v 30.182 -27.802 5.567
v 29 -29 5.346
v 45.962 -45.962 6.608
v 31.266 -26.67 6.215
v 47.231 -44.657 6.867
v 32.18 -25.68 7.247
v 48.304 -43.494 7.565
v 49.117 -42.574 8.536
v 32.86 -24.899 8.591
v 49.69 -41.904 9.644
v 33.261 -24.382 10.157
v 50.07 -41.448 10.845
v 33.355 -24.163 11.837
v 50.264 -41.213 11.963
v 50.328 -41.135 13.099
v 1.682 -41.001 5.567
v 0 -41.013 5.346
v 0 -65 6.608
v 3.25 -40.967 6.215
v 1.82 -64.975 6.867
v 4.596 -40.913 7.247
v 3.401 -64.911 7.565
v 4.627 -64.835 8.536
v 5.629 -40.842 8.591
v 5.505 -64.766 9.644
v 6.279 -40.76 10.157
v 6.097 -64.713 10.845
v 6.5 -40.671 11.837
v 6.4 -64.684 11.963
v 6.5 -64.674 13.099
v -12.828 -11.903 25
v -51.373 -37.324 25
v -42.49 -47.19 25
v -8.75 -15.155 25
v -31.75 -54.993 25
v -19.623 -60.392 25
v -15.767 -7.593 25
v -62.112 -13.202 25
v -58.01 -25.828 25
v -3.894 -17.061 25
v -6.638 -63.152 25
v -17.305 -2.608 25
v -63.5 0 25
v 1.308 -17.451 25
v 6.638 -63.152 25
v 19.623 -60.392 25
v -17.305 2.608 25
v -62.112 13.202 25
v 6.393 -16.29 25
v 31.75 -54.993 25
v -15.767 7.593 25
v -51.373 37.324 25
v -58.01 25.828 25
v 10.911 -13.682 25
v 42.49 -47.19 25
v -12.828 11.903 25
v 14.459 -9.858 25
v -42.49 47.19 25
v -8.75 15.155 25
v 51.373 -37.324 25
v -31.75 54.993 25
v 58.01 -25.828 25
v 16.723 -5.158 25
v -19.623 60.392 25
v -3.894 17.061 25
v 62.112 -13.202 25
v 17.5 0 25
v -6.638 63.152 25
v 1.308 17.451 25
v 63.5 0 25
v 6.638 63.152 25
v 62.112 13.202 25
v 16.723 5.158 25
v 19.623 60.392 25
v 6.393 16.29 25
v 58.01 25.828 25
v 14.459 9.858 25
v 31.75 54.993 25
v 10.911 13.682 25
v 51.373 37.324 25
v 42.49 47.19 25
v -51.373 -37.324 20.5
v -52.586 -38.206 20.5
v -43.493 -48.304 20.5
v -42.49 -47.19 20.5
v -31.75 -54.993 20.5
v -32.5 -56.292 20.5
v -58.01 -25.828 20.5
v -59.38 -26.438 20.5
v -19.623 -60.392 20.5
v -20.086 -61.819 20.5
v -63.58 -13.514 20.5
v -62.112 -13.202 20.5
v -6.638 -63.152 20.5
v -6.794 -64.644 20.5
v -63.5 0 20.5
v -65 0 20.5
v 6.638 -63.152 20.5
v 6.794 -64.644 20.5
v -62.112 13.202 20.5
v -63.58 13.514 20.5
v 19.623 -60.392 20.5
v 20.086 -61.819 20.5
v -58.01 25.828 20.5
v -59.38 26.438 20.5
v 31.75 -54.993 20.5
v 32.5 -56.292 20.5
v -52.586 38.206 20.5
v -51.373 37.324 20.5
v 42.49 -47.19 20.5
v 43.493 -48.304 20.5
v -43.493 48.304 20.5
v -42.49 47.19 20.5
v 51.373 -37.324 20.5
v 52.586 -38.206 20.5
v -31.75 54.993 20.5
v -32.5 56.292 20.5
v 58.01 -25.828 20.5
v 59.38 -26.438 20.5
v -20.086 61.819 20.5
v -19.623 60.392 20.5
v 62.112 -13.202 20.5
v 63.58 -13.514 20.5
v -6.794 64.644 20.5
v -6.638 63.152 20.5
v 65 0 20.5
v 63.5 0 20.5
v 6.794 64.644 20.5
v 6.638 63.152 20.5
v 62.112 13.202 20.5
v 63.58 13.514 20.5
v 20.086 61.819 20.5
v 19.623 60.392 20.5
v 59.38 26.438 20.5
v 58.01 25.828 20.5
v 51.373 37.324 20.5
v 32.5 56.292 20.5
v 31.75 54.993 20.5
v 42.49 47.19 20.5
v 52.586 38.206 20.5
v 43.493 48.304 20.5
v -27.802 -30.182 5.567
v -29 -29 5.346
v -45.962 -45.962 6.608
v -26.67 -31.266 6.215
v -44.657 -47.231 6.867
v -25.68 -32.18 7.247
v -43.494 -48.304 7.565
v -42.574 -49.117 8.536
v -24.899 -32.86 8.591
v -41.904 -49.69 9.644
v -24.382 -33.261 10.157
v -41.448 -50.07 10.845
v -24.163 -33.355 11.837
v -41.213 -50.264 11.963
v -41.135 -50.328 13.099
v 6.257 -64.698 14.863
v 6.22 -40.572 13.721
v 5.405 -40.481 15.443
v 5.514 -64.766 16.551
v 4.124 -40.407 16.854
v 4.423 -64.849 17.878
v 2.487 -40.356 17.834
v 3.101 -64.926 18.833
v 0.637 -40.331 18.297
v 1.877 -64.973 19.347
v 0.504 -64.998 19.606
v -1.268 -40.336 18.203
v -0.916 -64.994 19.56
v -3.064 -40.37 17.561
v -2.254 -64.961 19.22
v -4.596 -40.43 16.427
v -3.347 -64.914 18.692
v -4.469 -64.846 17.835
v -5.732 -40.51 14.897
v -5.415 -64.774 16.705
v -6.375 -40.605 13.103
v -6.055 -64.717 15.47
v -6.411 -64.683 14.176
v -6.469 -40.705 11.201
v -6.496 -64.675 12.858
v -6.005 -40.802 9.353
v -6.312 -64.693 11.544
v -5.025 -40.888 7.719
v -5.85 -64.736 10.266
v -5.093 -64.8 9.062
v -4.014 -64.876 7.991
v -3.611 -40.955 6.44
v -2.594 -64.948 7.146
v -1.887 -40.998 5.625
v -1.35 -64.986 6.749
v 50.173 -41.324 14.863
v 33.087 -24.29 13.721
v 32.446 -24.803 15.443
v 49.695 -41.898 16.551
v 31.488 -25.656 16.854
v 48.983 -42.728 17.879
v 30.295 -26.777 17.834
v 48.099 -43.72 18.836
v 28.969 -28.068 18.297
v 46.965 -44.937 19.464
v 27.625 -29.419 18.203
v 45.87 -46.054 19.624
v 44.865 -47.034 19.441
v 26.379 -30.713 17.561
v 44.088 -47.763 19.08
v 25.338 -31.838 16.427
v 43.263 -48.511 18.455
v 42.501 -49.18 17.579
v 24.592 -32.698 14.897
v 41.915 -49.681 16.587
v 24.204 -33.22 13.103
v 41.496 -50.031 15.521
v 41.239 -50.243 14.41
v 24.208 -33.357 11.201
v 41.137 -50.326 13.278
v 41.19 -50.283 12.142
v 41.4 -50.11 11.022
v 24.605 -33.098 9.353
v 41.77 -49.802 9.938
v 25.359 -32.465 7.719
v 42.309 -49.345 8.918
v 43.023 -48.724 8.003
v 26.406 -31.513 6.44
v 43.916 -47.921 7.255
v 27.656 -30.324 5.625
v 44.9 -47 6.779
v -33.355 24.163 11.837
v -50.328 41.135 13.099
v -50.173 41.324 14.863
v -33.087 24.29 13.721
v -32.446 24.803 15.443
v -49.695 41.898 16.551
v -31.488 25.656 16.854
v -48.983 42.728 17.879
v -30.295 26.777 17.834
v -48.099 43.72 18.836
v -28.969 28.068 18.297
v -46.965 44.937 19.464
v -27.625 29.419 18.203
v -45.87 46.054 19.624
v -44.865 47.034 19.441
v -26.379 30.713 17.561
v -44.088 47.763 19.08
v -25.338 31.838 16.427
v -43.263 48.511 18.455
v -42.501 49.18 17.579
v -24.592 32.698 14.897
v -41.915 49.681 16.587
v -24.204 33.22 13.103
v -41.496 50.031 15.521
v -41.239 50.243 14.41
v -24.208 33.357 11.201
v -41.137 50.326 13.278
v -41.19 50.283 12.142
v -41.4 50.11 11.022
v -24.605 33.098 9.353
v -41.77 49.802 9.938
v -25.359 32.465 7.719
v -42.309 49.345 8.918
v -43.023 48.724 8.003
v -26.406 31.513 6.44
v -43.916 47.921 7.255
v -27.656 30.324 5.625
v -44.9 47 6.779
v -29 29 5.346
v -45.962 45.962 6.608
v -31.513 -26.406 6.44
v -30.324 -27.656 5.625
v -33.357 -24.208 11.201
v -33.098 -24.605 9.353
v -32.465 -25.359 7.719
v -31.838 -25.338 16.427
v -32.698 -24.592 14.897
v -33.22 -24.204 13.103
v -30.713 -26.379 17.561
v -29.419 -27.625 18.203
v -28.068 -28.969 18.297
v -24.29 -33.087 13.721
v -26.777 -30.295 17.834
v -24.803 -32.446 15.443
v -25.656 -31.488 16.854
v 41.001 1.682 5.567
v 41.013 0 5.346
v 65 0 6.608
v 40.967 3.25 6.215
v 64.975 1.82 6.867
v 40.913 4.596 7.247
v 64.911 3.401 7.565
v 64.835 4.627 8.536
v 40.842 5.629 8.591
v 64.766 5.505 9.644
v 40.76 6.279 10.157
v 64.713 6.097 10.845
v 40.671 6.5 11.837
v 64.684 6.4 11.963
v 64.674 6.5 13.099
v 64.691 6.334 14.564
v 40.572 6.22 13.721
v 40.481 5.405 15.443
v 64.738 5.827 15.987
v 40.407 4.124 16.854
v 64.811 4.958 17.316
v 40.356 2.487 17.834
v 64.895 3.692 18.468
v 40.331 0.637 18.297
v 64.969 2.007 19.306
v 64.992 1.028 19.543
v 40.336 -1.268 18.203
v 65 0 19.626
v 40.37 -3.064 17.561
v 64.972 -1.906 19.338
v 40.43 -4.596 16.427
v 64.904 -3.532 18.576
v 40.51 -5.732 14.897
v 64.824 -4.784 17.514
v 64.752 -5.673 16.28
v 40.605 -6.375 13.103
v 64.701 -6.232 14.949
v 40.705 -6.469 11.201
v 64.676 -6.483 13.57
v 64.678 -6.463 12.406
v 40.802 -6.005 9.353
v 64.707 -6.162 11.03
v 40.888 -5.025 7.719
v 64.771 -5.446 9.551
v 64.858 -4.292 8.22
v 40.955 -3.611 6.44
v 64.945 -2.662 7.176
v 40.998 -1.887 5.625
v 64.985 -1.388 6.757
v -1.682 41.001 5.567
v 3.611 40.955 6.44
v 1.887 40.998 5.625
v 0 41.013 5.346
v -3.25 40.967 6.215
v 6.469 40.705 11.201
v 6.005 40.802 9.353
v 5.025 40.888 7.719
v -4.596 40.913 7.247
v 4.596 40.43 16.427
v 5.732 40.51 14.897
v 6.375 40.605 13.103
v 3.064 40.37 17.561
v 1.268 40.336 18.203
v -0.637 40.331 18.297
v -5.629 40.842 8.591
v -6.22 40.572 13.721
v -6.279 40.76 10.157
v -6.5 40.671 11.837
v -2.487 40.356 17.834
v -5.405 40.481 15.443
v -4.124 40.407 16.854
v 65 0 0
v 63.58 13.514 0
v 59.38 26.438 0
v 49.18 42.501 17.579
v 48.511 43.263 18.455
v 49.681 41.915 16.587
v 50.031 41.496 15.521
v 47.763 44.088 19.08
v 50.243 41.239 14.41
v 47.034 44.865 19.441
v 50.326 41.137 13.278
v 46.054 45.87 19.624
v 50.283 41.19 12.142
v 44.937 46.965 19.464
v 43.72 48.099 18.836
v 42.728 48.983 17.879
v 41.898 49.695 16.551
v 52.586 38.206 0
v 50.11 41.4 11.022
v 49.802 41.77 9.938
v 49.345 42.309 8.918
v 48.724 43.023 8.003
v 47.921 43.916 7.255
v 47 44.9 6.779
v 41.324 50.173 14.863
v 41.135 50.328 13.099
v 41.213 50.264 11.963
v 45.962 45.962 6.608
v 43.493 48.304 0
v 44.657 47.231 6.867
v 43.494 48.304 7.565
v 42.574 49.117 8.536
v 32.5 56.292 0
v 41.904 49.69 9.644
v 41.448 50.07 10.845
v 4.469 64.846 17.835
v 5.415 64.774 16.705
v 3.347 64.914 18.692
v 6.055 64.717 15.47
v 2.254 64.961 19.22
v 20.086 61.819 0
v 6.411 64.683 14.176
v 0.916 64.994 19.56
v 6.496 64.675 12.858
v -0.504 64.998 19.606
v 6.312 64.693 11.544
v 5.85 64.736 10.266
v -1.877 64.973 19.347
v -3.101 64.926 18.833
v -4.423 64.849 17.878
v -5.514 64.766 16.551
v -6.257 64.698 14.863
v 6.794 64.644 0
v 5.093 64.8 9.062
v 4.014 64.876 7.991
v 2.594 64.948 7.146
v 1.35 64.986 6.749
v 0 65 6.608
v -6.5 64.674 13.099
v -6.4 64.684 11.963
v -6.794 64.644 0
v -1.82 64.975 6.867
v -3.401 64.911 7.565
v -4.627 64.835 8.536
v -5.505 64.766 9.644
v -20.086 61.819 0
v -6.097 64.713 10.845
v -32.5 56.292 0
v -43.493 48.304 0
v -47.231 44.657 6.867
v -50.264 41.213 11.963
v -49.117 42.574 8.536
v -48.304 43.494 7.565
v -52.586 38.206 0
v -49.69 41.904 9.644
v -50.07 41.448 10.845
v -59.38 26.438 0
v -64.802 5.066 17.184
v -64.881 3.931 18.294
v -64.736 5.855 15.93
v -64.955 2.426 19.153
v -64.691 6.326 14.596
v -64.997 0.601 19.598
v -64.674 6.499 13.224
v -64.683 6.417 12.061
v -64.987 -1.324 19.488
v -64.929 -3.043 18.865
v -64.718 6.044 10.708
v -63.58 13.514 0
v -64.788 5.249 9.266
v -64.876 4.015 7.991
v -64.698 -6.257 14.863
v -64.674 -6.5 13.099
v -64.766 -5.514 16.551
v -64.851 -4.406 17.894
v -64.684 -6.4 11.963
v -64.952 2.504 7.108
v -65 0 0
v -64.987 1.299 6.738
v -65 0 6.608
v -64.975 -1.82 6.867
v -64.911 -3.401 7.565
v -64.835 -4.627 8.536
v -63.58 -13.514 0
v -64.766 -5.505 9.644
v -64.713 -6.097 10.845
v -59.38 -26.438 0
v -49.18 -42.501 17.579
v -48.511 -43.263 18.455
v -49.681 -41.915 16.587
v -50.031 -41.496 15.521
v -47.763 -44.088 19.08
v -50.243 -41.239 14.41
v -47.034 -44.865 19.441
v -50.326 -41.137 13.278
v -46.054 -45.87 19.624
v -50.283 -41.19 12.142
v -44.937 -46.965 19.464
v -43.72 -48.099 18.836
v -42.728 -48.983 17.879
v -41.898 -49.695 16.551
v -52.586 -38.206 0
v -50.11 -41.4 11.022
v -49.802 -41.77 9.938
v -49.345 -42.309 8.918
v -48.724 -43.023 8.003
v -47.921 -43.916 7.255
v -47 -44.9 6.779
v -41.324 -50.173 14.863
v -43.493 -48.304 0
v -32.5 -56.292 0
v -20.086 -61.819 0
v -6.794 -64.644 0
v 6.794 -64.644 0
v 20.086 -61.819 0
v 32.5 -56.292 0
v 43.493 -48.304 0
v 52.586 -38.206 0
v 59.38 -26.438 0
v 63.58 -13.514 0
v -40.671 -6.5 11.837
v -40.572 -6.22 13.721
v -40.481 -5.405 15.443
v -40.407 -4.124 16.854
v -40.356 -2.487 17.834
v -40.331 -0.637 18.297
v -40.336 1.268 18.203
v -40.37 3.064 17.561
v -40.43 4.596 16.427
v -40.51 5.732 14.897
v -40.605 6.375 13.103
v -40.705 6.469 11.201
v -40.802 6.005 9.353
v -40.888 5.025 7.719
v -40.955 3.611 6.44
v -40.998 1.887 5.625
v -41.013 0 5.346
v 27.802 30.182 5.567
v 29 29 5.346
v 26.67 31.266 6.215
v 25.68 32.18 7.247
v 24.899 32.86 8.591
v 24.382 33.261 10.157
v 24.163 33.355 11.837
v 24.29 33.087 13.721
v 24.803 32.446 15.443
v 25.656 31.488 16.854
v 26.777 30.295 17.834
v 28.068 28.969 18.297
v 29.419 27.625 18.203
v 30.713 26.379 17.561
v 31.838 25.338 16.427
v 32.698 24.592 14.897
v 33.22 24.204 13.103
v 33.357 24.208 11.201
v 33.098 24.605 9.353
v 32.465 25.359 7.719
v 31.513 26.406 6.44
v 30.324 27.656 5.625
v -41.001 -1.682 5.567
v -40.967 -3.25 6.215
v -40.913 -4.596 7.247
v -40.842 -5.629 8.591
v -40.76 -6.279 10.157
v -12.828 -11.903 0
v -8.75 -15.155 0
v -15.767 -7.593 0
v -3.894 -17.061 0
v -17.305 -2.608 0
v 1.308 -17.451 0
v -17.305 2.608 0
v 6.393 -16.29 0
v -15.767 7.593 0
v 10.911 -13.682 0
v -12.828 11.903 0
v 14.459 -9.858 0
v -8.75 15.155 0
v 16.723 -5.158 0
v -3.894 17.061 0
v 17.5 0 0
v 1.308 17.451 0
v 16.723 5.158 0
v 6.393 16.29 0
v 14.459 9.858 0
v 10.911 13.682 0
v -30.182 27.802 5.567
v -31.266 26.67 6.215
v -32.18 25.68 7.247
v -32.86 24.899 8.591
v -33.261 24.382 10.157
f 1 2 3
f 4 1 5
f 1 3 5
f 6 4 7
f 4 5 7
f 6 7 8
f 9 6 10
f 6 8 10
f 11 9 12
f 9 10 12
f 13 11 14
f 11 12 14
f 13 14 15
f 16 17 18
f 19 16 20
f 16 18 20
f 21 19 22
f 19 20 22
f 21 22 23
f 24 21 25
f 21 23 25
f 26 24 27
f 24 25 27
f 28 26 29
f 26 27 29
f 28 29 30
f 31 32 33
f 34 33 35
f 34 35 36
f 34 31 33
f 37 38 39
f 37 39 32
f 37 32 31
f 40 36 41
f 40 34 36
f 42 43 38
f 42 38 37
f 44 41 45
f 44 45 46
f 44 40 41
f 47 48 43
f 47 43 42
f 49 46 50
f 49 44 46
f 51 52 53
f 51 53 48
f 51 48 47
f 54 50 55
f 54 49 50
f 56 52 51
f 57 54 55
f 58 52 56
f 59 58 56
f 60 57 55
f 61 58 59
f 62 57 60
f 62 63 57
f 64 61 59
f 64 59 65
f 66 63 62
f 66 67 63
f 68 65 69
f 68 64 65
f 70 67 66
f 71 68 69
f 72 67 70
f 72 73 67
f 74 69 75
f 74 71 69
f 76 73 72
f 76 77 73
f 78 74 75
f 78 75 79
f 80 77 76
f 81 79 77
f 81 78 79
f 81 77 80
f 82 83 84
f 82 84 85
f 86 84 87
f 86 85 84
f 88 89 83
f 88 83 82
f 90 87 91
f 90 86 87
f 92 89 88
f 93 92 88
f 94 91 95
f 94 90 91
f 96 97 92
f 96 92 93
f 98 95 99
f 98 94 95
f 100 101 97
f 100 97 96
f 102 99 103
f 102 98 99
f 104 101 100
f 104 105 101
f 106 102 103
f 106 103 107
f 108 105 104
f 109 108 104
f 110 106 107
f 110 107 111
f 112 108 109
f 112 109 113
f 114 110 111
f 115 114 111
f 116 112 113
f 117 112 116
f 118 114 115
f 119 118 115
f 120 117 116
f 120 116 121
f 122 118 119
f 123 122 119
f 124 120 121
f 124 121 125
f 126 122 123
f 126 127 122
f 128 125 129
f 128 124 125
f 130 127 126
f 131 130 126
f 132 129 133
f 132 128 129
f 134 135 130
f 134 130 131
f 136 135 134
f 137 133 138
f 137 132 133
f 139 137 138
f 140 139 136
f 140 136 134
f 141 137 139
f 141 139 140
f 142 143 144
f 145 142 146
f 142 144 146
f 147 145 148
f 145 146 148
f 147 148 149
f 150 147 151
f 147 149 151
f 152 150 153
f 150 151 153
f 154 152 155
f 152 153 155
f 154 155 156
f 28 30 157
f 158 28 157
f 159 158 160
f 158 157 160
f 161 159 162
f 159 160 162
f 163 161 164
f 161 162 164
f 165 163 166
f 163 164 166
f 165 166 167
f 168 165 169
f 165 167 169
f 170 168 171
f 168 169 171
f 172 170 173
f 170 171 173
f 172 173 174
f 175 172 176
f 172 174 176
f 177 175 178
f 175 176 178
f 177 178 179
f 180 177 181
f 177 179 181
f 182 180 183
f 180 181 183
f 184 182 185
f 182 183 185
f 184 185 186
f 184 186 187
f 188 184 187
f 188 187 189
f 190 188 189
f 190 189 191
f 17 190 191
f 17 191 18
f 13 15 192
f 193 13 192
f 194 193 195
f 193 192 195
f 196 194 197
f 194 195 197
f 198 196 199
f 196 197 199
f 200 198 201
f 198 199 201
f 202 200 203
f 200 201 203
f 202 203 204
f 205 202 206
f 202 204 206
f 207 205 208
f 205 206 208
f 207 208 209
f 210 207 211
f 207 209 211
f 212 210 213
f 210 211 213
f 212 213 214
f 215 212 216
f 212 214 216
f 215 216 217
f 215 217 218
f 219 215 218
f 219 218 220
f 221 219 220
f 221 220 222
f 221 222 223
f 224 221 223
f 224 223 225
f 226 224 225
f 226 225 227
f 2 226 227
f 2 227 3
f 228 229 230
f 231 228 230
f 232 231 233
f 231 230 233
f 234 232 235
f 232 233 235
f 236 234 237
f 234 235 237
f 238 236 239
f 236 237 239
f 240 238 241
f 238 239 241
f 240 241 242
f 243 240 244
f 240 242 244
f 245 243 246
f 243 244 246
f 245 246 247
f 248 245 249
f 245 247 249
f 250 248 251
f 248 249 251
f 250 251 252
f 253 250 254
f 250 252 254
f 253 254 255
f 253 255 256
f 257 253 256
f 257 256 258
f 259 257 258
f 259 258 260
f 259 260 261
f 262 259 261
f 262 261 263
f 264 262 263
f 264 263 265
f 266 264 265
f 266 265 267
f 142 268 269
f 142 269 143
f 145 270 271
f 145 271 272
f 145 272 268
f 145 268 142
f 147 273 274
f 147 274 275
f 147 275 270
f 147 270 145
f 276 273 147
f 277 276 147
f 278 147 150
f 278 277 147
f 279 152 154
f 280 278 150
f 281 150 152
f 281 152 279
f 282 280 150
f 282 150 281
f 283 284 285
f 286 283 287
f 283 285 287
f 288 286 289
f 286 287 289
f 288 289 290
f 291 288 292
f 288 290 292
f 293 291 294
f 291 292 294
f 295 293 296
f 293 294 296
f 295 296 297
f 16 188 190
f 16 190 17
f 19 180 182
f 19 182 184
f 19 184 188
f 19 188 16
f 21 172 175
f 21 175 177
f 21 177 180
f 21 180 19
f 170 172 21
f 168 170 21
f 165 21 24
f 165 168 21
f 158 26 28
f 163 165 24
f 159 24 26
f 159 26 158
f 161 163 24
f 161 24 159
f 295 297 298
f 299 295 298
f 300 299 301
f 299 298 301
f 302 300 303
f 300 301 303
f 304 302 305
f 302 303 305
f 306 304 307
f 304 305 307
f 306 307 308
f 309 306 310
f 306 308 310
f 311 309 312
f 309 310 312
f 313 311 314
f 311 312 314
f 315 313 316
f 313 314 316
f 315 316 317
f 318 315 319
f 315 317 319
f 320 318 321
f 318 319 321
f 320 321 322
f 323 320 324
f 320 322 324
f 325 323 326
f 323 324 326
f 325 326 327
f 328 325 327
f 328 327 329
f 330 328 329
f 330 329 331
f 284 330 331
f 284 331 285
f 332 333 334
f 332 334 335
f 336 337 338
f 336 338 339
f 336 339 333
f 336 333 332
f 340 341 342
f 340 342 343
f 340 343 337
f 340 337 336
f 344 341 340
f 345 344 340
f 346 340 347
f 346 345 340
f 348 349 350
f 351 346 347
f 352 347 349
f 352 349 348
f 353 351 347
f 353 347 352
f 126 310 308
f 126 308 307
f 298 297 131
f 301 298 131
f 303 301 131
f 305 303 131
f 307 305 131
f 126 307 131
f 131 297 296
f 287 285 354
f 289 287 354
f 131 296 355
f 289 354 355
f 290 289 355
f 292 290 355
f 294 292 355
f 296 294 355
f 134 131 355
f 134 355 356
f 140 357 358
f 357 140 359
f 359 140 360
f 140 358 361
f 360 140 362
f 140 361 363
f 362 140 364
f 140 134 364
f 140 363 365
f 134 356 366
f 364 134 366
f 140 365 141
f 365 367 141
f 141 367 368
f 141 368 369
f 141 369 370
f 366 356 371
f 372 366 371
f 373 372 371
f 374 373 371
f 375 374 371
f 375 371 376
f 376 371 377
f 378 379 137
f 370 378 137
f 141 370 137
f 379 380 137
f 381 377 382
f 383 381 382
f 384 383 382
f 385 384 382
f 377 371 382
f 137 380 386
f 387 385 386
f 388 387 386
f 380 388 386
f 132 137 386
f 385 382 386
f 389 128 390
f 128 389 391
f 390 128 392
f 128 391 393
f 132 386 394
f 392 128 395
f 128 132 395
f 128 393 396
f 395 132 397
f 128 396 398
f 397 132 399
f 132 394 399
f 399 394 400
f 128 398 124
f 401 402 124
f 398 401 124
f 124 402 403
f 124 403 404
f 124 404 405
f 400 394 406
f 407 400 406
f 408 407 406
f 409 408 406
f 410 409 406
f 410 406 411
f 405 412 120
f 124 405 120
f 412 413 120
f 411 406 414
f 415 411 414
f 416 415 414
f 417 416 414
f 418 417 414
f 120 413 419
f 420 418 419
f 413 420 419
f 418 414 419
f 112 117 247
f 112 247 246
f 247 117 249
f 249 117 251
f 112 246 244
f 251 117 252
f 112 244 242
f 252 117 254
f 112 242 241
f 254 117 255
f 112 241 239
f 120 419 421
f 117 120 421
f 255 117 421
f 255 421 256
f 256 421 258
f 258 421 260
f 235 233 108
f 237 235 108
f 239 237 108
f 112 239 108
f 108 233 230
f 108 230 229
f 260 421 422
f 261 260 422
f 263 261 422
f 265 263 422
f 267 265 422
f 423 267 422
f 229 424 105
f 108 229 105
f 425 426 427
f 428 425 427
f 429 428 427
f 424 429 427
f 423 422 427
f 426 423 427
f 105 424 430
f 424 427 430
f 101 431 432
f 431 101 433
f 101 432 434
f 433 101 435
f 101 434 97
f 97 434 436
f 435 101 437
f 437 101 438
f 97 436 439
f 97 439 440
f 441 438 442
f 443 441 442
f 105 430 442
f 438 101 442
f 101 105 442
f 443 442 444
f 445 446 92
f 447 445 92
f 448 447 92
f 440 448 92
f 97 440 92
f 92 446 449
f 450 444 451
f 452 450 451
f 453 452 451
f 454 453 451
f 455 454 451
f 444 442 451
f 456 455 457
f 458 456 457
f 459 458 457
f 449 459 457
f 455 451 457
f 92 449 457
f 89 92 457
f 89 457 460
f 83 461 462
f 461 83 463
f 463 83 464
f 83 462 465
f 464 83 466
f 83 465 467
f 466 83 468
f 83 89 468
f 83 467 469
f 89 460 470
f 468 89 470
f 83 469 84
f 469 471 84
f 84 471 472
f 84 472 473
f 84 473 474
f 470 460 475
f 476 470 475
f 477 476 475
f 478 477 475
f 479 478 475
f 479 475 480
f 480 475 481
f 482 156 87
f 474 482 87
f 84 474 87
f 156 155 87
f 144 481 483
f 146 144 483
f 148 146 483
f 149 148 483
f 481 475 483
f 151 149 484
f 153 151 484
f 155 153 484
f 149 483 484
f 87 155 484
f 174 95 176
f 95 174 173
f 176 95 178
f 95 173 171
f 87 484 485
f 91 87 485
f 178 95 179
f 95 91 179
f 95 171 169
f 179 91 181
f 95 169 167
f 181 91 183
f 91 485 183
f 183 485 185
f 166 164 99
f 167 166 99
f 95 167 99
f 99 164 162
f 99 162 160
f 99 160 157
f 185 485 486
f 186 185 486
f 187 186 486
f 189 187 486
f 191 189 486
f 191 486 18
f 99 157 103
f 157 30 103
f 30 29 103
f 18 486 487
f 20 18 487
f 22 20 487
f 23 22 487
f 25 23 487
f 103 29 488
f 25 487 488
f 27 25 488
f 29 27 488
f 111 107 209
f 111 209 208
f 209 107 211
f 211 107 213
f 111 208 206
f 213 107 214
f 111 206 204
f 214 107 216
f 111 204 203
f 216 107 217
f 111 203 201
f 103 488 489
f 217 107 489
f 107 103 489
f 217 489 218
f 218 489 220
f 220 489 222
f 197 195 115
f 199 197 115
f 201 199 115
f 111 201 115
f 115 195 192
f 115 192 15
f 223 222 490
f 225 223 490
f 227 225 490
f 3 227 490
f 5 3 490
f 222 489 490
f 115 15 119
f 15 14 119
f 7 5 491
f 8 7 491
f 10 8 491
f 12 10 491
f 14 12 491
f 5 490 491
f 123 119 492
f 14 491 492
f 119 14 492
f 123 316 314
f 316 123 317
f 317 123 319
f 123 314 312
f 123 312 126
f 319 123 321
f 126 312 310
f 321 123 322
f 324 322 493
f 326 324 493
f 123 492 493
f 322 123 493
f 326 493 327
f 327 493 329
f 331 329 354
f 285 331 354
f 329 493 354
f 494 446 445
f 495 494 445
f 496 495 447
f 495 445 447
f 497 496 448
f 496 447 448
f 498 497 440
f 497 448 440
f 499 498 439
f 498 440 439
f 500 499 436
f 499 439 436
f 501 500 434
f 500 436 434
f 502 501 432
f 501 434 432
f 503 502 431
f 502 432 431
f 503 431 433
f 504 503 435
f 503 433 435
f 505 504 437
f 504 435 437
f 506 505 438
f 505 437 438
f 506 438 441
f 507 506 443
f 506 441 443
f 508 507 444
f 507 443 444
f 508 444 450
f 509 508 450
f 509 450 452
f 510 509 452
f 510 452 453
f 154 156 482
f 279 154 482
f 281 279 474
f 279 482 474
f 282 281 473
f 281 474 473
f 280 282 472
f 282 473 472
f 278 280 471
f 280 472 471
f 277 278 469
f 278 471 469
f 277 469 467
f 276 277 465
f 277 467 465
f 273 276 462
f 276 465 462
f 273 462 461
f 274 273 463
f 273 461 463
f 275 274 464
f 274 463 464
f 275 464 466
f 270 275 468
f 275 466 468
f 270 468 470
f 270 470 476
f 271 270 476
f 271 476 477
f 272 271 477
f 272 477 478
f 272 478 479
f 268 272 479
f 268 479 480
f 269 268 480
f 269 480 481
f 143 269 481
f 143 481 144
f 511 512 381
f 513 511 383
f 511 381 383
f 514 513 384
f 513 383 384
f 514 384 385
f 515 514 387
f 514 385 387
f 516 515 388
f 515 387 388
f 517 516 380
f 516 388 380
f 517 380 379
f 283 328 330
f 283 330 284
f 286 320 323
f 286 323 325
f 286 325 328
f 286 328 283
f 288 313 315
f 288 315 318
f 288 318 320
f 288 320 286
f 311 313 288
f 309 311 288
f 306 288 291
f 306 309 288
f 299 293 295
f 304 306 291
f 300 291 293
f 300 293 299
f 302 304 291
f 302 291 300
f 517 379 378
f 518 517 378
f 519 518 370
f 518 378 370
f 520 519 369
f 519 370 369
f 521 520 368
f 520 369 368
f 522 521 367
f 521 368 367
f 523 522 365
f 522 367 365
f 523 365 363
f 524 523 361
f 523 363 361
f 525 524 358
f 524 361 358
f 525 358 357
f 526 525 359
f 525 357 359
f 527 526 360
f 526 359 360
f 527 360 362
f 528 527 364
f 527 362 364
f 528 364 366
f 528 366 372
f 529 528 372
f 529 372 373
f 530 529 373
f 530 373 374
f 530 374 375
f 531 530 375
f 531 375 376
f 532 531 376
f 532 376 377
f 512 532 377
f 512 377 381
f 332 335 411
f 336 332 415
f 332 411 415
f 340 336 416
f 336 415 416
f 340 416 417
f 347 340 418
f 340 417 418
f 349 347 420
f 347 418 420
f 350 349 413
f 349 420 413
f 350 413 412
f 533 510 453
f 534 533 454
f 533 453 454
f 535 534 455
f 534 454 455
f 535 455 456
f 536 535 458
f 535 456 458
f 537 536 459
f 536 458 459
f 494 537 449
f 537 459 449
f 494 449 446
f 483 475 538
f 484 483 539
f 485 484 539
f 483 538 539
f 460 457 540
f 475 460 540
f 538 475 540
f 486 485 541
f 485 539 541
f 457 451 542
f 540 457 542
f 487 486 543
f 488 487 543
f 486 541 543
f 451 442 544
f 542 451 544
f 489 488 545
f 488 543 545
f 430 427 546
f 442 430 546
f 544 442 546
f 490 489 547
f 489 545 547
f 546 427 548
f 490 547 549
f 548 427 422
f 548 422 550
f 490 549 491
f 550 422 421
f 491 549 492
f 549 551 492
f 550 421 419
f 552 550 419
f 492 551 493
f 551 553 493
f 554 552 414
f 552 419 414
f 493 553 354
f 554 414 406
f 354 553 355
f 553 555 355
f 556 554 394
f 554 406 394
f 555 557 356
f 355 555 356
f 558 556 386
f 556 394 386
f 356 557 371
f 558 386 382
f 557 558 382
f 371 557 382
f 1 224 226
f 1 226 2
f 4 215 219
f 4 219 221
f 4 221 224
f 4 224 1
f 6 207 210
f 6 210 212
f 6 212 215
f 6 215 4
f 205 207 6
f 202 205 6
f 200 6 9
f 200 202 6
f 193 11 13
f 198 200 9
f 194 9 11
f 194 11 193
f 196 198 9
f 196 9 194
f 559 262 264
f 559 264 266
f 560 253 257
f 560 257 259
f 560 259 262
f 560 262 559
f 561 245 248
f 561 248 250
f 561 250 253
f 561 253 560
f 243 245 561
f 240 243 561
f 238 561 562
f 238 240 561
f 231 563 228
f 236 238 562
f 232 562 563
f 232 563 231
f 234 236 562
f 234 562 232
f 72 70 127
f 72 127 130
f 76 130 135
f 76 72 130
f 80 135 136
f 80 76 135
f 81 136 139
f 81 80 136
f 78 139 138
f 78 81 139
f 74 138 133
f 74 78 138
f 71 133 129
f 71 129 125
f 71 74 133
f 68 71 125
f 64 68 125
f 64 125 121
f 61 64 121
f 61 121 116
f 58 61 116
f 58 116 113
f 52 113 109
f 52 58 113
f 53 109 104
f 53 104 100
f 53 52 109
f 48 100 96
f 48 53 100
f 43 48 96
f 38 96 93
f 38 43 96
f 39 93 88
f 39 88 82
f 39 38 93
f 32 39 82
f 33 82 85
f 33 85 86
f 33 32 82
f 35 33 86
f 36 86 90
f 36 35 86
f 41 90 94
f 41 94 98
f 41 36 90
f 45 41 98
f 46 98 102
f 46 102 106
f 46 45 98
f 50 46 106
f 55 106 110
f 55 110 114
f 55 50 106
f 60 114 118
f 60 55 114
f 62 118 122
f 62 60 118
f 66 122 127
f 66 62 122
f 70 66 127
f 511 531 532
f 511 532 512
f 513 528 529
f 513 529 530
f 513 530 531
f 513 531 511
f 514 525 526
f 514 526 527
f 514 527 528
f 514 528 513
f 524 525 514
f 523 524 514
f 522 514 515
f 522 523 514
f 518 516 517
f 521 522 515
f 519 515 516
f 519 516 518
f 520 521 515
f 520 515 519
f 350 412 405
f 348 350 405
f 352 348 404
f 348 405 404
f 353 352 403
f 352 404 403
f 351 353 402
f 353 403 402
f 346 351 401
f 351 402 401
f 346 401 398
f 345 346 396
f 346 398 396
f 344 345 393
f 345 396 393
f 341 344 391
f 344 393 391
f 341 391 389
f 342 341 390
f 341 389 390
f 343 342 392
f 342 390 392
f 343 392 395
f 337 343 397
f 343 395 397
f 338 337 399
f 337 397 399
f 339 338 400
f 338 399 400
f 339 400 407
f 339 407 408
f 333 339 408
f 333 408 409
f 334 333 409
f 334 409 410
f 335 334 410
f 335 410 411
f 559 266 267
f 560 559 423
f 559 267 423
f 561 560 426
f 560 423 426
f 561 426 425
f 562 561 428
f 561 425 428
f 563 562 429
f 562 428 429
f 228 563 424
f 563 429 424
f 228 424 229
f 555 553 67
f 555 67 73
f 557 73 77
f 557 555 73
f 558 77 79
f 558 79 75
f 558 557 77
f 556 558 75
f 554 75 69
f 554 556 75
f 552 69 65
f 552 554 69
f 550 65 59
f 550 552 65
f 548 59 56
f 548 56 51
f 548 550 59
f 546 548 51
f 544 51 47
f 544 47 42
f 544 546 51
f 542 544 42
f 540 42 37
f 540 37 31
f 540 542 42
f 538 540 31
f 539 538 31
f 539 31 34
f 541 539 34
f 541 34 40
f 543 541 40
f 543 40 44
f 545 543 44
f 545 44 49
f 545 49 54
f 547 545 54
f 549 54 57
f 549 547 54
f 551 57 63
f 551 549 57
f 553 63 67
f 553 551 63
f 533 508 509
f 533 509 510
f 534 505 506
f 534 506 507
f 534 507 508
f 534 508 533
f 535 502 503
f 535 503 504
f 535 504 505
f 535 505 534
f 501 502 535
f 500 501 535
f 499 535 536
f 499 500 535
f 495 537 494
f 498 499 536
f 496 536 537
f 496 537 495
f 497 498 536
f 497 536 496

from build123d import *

# Parameters (mm, degrees)
F0_R            = 65
F0_R_2          = 17.5
F1_DEPTH        = 25
F9_DEPTH        = 25
F9_COPIES_COUNT = 8
F10_R           = 65
F10_R_2         = 63.5
F11_DEPTH       = 4.5


# Not quite as in the source:
# - a pattern or mirror of a feature is missing from the dataset's text; its kind, count and spacing are read off the source's solid


with BuildPart() as f1:
    # F0 (on Top) → F1 (new body)
    with BuildSketch(Plane.XY):
        Circle(F0_R)
        Circle(F0_R_2, mode=Mode.SUBTRACT)
    extrude(amount=F1_DEPTH)

    # F8 (on 3pt) → F9 (cut)
    with BuildSketch(Plane(origin=(0, 66.1453359033, 3.4796235199), x_dir=(-1, 0, 0), z_dir=(0, 0.998619184, 0.0525330887))):
        with BuildLine():
            ThreePointArc((0, 3.1838245746), (4.5961940777, 5.0876304969), (6.5, 9.6838245746))
            ThreePointArc((6.5, 9.6838245746), (-4.5961940777, 14.2800186523), (0, 3.1838245746))
        make_face()
    f9 = extrude(amount=-F9_DEPTH, mode=Mode.SUBTRACT)

    # F9_copies: F9 ×8 about axis
    f9_copies_axis = Axis((0, 0, 0), (0, 0, 1))
    for i in range(1, F9_COPIES_COUNT):
        add(f9.rotate(f9_copies_axis, i * 360 / F9_COPIES_COUNT), mode=Mode.SUBTRACT)

    # F10 (on face) → F11 (cut)
    with BuildSketch(Plane.XY.offset(25)):
        Circle(F10_R)
        Circle(F10_R_2, mode=Mode.SUBTRACT)
    extrude(amount=-F11_DEPTH, mode=Mode.SUBTRACT)


solid = f1.part
